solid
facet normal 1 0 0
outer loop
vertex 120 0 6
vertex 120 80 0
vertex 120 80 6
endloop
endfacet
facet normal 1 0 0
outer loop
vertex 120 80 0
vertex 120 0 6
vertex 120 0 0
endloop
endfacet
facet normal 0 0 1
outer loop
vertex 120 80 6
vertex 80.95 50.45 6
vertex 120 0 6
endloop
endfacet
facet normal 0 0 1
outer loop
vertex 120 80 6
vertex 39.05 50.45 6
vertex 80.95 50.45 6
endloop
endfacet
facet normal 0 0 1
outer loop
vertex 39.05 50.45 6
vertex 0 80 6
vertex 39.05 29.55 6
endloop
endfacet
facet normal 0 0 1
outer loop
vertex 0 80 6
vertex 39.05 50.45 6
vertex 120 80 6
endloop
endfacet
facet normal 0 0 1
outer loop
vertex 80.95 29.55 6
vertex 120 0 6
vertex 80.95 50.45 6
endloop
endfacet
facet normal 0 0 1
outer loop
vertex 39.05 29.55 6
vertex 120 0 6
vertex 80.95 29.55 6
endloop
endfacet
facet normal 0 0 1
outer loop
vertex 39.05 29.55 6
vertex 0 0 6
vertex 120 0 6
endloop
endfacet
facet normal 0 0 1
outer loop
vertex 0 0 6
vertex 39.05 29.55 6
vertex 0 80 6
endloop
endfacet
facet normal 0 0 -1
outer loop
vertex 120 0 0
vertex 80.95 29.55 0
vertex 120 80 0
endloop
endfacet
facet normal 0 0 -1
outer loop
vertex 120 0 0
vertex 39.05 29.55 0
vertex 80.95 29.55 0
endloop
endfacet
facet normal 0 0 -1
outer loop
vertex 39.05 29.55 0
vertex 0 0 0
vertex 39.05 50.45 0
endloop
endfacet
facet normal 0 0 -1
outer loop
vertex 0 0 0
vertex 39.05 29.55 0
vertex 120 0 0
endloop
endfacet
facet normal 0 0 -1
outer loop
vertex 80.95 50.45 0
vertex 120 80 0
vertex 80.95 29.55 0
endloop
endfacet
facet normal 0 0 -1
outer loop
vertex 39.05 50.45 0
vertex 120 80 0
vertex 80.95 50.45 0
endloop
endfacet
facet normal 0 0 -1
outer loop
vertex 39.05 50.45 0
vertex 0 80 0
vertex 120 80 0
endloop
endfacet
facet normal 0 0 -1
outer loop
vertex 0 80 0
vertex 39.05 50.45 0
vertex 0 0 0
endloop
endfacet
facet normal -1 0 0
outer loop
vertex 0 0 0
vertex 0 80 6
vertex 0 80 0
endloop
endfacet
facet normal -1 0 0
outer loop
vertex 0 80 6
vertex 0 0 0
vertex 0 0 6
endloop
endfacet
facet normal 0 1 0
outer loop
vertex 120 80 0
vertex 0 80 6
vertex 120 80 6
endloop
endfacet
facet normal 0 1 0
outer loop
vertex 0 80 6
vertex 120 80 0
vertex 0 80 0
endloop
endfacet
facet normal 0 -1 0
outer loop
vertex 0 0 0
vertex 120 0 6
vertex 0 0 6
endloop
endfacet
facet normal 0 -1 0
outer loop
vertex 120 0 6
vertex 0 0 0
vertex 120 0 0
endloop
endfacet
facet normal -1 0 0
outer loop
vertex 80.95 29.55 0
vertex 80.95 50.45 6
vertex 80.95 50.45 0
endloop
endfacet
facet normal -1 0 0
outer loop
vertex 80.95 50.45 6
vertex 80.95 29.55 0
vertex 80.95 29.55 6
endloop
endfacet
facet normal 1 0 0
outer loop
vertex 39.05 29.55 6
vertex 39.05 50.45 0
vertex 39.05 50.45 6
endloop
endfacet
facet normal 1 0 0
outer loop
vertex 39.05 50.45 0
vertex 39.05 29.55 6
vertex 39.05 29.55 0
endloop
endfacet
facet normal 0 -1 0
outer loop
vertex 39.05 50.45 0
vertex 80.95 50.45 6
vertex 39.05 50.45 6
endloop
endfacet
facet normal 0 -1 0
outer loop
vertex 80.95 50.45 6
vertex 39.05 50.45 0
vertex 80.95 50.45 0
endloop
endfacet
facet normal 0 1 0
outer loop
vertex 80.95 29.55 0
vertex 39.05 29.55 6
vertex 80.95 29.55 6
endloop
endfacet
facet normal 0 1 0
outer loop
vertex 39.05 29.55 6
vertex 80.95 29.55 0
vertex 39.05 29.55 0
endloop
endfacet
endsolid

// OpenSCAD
module pt_base() {
  w=120.0; h=80.0; t=6.0;
  difference() {
    cube([w,h,t], center=false);
    translate([(w-40.7-2*0.6)/2, (h-19.7-2*0.6)/2, -1])
      cube([40.7+2*0.6, 19.7+2*0.6, t+2], center=false);
  }
}
pt_base();
